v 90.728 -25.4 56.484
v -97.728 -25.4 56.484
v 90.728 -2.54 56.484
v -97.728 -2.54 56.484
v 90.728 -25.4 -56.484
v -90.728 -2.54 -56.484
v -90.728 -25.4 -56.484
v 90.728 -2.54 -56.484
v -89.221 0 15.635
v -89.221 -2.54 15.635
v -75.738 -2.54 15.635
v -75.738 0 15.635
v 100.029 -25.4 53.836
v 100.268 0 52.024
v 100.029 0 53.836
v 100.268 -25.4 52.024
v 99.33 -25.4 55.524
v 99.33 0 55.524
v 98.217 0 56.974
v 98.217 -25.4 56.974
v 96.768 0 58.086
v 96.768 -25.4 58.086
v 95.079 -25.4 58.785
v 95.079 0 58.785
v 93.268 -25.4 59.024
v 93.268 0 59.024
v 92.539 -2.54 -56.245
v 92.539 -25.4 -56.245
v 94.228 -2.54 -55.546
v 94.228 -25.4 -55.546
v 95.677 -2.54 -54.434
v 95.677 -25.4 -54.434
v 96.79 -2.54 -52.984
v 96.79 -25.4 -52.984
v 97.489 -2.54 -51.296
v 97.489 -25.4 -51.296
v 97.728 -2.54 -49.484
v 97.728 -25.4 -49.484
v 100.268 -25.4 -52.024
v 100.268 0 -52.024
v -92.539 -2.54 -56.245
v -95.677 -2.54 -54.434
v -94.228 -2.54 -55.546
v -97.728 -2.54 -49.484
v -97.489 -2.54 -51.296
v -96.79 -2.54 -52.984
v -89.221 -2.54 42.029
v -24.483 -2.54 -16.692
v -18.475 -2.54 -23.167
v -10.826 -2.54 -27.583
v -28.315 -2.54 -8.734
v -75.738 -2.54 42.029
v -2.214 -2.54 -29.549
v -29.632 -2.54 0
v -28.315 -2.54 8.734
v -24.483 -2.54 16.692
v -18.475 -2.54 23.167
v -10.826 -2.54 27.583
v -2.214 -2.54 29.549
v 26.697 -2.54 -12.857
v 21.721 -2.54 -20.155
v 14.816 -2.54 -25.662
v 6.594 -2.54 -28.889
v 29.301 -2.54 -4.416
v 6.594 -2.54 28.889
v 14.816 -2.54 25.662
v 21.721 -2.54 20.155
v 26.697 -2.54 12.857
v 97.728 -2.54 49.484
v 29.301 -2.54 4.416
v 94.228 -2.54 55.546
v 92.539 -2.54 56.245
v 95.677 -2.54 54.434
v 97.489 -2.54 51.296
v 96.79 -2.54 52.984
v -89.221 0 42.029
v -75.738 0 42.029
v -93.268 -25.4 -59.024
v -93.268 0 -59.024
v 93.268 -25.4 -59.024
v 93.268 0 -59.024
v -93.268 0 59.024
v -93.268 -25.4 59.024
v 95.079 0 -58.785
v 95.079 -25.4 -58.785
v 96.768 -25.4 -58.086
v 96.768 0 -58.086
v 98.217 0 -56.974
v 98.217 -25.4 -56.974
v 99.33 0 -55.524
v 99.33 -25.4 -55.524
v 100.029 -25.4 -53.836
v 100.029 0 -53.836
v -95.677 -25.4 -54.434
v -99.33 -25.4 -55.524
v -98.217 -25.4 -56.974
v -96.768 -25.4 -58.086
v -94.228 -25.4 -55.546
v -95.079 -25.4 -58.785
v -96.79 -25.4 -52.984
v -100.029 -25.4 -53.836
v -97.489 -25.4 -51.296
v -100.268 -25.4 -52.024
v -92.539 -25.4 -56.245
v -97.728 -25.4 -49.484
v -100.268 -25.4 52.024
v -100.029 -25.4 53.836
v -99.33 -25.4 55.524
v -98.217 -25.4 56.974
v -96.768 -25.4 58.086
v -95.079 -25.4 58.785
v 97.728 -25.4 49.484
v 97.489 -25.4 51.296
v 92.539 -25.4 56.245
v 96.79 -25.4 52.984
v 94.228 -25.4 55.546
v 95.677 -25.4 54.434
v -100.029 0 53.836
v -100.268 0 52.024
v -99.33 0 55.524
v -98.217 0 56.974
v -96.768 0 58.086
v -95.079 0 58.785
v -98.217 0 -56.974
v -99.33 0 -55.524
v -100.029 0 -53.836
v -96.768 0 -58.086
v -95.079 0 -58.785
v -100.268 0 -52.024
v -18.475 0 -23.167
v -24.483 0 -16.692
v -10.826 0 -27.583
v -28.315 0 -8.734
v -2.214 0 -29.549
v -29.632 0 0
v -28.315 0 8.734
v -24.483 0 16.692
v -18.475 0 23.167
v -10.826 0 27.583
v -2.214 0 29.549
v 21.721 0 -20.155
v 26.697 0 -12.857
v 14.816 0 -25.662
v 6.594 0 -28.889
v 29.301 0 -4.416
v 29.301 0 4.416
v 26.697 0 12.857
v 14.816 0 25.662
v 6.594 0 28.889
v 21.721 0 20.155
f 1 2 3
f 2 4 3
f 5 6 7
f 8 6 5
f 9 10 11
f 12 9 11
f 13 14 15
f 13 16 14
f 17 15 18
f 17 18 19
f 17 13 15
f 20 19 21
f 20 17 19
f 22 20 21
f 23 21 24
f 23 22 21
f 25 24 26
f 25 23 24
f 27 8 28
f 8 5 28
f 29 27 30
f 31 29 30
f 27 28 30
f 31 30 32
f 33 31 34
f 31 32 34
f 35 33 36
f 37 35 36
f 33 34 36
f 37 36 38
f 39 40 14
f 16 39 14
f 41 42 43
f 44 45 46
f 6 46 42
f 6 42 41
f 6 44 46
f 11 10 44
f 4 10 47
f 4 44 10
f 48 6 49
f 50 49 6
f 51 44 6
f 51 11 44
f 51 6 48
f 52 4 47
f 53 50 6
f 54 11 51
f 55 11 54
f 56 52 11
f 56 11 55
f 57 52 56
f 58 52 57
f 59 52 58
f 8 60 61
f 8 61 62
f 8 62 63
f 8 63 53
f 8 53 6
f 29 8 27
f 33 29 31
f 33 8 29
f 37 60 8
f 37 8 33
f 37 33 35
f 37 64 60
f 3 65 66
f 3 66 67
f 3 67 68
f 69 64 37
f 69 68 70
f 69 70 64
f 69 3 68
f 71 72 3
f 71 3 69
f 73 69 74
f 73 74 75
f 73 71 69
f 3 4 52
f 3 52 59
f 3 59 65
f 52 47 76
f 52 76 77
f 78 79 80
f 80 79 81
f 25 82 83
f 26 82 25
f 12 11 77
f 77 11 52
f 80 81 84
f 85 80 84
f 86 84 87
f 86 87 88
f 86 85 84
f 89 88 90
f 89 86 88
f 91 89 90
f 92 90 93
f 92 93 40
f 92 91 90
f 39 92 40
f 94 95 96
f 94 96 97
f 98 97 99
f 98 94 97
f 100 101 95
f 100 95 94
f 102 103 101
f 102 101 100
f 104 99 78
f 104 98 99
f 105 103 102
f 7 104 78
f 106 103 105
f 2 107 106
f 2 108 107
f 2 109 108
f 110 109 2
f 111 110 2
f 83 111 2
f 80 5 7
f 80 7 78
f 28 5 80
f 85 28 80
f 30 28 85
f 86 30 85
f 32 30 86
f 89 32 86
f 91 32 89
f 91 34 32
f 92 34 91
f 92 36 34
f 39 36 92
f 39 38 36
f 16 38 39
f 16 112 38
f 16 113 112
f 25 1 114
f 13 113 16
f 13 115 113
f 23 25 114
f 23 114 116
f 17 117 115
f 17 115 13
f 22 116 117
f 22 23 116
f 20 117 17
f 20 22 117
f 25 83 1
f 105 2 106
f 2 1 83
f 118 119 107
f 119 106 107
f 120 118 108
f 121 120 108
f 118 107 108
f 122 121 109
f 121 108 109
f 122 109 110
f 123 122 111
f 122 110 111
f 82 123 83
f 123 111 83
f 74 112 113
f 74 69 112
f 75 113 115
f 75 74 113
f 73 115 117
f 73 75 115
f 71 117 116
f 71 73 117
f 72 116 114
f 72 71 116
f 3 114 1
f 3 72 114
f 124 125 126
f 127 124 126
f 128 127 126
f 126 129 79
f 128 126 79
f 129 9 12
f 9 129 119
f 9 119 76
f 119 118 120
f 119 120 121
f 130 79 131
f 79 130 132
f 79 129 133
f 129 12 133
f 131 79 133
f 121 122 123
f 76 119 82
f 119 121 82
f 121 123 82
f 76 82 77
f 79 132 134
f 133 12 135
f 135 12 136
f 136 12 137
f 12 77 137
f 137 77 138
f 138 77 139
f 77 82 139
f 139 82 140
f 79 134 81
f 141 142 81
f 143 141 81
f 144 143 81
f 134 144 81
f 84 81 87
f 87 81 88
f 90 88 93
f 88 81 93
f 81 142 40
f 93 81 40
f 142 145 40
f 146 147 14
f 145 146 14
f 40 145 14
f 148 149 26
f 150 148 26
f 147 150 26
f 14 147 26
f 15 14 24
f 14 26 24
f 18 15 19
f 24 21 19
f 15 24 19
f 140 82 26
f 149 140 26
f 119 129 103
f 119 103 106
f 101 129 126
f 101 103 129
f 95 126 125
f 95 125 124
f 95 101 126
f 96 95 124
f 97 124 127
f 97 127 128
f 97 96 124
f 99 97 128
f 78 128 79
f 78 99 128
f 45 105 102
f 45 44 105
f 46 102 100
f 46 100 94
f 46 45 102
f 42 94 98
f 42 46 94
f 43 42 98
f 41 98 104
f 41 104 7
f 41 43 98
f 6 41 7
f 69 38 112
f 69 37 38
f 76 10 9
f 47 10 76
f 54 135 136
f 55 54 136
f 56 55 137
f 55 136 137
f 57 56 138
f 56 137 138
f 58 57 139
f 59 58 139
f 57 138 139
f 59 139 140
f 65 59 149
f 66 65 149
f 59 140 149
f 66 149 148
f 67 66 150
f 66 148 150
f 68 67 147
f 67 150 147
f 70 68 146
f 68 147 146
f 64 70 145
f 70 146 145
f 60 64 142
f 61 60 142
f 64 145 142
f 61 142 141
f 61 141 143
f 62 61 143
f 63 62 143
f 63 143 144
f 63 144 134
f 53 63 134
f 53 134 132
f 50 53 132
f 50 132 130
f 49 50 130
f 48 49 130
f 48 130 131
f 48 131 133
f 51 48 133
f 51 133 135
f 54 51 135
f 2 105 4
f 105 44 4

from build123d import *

# Parameters (mm, degrees)
F0_W     = 200.5350887775
F0_H     = 118.04754287
F1_DEPTH = 25.4
F2_T     = -2.54
F3_R     = 7
F4_W     = 13.4836062789
F4_H     = 26.3934414834
F5_DEPTH = 25
F6_R     = 29.6315052435
F7_DEPTH = 25


with BuildPart() as f1:
    # F0 (on Front) → F1 (new body)
    with BuildSketch(Plane.XZ):
        Rectangle(F0_W, F0_H)
    extrude(amount=F1_DEPTH)

    # F2
    f2_openings = [f1.faces().sort_by_distance(p)[0] for p in [
        (0, -25.4, 0),
    ]]
    offset(amount=F2_T, openings=f2_openings)

    # F3
    f3_edges = [f1.edges().sort_by_distance(p)[0] for p in [
        (-100.267544, -12.7, 59.023771),
        (100.267544, -12.7, 59.023771),
        (100.267544, -12.7, -59.023771),
        (-100.267544, -12.7, -59.023771),
        (97.727544, -13.97, 56.483771),
        (97.727544, -13.97, -56.483771),
        (-97.727544, -13.97, -56.483771),
    ]]
    fillet(f3_edges, radius=F3_R)

    # F4 (on face) → F5 (cut)
    with BuildSketch(Plane.XZ.offset(2.54)):
        with Locations((-82.4795104563, 28.8319671527)):
            Rectangle(F4_W, F4_H)
    extrude(amount=-F5_DEPTH, mode=Mode.SUBTRACT)

    # F6 (on face) → F7 (cut)
    with BuildSketch(Plane(origin=(0, 0, 0), x_dir=(-1, 0, 0), z_dir=(0, 1, 0))):
        Circle(F6_R)
    extrude(amount=-F7_DEPTH, mode=Mode.SUBTRACT)


solid = f1.part
